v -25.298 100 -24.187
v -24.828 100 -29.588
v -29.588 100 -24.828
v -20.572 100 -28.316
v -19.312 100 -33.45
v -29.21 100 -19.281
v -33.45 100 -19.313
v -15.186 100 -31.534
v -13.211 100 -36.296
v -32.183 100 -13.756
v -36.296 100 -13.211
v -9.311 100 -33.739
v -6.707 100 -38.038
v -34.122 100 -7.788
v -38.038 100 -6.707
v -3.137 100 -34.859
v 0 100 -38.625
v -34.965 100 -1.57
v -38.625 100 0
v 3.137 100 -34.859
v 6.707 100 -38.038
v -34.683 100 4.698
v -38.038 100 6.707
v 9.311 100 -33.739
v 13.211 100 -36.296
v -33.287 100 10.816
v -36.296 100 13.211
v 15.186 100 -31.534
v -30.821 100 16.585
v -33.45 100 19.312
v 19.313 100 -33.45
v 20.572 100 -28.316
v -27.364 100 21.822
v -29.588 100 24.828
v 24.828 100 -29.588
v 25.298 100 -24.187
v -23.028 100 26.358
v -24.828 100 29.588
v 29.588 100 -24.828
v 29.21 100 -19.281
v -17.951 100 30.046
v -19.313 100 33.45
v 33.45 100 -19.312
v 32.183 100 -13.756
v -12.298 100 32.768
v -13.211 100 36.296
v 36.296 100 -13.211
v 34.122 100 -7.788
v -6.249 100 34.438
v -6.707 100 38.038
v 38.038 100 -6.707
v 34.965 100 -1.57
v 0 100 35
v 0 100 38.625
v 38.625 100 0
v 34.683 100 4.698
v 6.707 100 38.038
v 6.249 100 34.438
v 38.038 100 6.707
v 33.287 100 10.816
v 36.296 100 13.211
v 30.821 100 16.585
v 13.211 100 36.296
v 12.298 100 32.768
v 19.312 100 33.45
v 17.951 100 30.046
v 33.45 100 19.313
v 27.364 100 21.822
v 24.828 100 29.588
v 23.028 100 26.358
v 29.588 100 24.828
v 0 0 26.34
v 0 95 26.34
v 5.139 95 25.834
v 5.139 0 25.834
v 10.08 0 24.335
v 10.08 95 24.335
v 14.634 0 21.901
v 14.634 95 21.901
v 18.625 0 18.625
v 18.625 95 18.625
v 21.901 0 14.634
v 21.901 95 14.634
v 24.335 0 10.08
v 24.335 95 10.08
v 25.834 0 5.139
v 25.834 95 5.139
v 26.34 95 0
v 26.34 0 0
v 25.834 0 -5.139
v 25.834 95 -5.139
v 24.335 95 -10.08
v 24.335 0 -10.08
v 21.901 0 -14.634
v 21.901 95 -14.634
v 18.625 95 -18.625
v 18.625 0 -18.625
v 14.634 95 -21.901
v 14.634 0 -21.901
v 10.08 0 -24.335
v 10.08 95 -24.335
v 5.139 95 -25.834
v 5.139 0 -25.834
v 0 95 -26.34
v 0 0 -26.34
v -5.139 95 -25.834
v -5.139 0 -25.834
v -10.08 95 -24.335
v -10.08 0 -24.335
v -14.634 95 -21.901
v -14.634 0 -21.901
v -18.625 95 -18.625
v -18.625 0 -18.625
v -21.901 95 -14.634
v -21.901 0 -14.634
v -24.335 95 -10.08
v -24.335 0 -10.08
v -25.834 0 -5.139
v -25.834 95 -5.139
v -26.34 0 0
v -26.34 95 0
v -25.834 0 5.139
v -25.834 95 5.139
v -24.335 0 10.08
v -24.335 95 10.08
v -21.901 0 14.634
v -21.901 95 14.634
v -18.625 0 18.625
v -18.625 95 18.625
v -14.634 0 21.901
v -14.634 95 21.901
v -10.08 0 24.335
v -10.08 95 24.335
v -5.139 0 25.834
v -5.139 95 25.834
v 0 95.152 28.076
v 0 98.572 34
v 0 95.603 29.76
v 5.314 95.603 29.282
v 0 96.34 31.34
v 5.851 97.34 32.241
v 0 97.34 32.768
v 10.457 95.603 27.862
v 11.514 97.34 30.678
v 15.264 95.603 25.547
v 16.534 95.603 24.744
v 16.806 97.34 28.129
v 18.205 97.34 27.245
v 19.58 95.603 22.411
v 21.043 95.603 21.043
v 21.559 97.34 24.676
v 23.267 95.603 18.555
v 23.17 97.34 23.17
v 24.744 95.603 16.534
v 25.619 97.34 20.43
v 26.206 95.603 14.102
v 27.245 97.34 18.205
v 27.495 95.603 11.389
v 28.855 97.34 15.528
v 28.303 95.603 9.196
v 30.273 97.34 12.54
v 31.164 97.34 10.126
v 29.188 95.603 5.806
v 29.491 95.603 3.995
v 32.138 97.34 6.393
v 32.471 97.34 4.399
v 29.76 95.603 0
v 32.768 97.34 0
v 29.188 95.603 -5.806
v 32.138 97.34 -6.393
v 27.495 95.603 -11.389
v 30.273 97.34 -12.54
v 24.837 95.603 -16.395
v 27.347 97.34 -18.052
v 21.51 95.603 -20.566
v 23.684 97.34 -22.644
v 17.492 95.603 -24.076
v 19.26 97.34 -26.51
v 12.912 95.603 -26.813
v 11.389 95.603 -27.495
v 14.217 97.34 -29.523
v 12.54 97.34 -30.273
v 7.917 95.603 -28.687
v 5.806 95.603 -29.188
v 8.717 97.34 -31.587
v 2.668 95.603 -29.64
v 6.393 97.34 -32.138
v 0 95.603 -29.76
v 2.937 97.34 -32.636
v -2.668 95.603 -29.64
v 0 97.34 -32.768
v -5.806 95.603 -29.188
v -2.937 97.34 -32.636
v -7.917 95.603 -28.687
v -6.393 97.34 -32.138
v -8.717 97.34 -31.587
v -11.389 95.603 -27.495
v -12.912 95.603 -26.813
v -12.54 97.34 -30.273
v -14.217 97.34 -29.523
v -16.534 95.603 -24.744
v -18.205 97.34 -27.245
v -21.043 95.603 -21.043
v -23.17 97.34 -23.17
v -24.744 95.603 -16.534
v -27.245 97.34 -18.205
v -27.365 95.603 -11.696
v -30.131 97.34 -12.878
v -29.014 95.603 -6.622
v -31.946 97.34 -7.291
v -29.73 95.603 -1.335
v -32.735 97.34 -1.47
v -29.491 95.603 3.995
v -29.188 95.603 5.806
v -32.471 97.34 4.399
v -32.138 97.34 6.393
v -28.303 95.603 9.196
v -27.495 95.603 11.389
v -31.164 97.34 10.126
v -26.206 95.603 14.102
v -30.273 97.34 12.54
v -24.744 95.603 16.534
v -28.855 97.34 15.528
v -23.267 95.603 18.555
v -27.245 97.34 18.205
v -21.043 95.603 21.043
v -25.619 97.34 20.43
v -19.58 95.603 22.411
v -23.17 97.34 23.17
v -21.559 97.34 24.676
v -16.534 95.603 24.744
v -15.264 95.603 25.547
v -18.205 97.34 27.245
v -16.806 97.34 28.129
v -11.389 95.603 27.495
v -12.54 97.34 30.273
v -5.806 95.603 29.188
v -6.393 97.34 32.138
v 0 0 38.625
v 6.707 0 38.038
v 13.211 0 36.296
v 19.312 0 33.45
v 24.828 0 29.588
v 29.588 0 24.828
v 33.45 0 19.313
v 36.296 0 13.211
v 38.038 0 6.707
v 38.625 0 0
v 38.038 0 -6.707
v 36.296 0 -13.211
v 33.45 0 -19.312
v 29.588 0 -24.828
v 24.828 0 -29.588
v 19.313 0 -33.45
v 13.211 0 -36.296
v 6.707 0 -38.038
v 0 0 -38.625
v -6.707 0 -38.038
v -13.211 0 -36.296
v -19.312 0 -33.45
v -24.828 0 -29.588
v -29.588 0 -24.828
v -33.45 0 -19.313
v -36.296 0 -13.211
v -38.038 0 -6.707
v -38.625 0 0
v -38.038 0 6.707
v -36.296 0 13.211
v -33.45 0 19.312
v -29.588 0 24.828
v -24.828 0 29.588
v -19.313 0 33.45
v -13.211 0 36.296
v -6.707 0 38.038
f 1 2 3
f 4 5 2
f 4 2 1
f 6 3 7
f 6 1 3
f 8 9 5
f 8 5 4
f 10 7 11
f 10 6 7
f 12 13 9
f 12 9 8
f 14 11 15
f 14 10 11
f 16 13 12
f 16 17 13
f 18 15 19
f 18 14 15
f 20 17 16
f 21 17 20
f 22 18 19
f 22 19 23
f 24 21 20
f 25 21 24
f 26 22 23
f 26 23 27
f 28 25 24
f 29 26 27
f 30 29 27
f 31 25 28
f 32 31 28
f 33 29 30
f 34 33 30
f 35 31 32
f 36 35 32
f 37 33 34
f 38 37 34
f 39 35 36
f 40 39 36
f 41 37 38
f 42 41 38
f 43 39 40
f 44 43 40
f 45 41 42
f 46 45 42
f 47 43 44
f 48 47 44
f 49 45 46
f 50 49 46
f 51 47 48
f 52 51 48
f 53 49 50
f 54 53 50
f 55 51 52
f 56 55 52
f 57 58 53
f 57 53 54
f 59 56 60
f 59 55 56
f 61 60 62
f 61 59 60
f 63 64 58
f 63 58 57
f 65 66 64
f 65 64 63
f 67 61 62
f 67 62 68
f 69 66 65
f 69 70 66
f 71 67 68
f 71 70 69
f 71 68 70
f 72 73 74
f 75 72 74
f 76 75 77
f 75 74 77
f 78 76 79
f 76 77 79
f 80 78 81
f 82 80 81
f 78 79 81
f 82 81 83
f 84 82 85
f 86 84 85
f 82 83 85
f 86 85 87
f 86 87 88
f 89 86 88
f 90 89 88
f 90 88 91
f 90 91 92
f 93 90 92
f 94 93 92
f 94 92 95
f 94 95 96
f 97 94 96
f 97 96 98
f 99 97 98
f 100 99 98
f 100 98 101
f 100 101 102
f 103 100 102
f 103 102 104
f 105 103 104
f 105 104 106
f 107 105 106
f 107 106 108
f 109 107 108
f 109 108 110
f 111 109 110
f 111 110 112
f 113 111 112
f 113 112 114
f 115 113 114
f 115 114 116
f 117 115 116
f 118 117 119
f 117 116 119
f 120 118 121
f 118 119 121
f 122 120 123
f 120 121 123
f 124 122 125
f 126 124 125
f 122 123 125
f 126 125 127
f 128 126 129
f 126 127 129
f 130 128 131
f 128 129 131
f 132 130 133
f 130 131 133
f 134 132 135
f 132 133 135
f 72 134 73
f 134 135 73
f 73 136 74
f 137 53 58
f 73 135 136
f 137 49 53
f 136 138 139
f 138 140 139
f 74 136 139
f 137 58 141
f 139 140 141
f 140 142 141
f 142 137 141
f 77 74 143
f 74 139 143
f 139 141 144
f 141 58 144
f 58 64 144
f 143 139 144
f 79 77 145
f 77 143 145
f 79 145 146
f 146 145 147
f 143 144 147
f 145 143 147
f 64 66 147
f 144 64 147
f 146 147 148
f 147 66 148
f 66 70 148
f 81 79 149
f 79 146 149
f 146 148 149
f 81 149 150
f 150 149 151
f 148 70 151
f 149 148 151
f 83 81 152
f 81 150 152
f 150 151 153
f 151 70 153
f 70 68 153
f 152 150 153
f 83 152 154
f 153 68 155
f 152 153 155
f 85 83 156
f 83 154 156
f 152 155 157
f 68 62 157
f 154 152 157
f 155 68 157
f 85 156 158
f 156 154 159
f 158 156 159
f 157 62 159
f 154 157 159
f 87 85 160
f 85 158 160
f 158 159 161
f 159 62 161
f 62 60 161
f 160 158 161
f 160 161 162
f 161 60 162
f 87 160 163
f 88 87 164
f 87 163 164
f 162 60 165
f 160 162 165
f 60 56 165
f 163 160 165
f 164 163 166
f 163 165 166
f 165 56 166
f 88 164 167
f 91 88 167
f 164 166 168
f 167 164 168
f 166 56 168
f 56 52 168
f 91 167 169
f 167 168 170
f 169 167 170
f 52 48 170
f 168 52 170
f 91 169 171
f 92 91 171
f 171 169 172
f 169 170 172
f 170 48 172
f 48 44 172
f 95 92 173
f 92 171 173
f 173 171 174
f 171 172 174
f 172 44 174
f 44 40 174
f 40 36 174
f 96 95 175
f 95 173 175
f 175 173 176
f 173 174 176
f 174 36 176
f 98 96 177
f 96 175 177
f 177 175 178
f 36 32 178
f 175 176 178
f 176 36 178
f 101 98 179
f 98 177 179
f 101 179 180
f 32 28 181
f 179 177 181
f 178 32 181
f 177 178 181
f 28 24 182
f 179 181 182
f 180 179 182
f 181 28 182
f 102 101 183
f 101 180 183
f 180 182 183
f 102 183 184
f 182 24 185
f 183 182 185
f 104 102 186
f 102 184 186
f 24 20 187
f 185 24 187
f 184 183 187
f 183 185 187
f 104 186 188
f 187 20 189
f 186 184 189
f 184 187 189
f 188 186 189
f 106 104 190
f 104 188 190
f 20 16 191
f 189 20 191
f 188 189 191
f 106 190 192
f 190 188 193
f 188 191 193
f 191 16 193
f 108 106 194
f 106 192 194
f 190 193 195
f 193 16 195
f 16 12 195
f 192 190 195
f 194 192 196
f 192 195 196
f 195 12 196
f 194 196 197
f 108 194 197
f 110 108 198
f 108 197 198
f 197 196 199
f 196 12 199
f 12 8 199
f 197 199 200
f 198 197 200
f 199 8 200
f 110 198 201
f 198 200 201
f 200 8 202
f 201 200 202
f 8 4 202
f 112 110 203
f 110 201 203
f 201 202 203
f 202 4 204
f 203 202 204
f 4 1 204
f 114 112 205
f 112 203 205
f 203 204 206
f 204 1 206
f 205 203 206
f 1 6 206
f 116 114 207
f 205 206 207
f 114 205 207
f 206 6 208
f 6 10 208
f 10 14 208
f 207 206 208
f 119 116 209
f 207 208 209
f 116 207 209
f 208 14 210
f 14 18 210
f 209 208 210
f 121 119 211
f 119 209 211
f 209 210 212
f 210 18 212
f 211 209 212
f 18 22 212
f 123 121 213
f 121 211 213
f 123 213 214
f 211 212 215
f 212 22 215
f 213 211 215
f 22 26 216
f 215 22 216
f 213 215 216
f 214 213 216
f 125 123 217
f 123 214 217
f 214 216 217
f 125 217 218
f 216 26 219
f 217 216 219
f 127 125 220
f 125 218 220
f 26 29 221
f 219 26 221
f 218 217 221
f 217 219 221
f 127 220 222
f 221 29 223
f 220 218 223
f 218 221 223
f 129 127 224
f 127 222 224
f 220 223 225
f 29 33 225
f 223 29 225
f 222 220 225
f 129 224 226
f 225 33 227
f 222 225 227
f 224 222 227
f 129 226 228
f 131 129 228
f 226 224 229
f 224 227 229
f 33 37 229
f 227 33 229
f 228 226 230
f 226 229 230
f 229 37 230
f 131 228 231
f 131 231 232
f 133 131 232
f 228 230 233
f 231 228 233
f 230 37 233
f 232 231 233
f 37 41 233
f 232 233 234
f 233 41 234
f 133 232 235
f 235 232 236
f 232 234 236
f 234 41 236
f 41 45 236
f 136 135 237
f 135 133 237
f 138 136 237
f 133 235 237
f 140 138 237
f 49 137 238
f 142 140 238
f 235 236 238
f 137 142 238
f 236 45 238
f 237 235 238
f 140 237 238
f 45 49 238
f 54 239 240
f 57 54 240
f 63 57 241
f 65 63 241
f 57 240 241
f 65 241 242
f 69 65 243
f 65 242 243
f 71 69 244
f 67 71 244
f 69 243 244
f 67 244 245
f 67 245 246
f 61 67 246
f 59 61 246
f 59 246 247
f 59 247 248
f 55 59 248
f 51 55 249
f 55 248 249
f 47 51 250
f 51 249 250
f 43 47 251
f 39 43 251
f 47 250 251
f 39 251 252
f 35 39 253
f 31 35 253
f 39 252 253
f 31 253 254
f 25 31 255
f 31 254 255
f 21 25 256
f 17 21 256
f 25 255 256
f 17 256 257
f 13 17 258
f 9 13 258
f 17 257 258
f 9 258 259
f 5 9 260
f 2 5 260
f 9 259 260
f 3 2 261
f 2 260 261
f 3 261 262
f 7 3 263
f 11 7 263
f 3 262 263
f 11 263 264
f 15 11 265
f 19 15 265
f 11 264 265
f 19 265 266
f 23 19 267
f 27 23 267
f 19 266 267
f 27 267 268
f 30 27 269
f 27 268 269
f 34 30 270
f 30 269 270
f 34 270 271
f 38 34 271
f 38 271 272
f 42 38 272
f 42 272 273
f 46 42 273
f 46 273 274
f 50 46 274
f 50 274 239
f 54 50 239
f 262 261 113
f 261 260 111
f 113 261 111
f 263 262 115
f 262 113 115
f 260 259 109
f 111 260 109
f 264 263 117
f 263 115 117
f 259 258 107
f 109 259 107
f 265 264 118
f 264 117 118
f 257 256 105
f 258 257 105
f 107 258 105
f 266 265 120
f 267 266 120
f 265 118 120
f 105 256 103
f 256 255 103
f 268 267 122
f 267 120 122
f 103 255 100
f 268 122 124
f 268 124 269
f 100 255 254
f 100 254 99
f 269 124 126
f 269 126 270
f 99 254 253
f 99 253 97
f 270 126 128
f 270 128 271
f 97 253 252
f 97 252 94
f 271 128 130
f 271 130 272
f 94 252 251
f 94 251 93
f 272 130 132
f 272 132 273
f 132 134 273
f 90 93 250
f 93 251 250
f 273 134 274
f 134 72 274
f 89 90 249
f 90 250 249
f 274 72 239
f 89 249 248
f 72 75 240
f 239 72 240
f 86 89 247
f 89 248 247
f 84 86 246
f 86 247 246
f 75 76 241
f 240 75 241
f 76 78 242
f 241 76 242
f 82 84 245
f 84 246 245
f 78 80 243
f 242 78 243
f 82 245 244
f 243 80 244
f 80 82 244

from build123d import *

# Parameters (mm, degrees)
SKETCH_1_R          = 38.625
EXTRUDE_1_DEPTH     = 100
SKETCH_2_R          = 35
CUT_EXTRUDE_3_DEPTH = 5
FILLET_8_R          = 10
SKETCH_4_R          = 26.339745962
CUT_EXTRUDE_4_DEPTH = 97.665379301


with BuildPart() as part:
    # 草圖1 → 填料-伸長1 (new body)
    with BuildSketch(Plane(origin=(0, 0, 0), x_dir=(1, 0, 0), z_dir=(0, 1, 0))):
        with Locations(Location((0, 0, 0), (0, 0, 270))):
            Circle(SKETCH_1_R)
    extrude(amount=EXTRUDE_1_DEPTH)

    # 草圖2 → 除料-伸長3 (cut)
    with BuildSketch(Plane(origin=(0, 100, 0), x_dir=(1, 0, 0), z_dir=(0, 1, 0))):
        with Locations(Location((0, 0, 0), (0, 0, 270))):
            Circle(SKETCH_2_R)
    extrude(amount=-CUT_EXTRUDE_3_DEPTH, mode=Mode.SUBTRACT)

    # 圓角8
    # the kernel refuses this fillet: 10 mm, written as the material it adds along each edge
    with BuildSketch(Plane(origin=(0, 95, 0), x_dir=(0, 0, 1), z_dir=(-1, 0, 0))) as fillet_8_piece_1:
        with BuildLine():
            CenterArc((26.339745962, 10), FILLET_8_R, 270, 60)
            Line((26.339745962, 0), (26.339745962, -0.2))
            Line((26.339745962, -0.2), (35, -0.2))
            Line((35, -0.2), (35.2, 0))
            ThreePointArc((35.2, 0), (35.2, 2.5), (35.173205081, 4.9))
            Line((35.173205081, 4.9), (35, 5))
        make_face()
    revolve(axis=Axis((0, 95, 0), (0, 1, 0)))

    # 草圖4 → 除料-伸長4 (cut)
    with BuildSketch(Plane(origin=(0, 95, 0), x_dir=(1, 0, 0), z_dir=(0, 1, 0))):
        with Locations(Location((0, 0, 0), (0, 0, 270))):
            Circle(SKETCH_4_R)
    extrude(amount=-CUT_EXTRUDE_4_DEPTH, mode=Mode.SUBTRACT)


solid = part.part
